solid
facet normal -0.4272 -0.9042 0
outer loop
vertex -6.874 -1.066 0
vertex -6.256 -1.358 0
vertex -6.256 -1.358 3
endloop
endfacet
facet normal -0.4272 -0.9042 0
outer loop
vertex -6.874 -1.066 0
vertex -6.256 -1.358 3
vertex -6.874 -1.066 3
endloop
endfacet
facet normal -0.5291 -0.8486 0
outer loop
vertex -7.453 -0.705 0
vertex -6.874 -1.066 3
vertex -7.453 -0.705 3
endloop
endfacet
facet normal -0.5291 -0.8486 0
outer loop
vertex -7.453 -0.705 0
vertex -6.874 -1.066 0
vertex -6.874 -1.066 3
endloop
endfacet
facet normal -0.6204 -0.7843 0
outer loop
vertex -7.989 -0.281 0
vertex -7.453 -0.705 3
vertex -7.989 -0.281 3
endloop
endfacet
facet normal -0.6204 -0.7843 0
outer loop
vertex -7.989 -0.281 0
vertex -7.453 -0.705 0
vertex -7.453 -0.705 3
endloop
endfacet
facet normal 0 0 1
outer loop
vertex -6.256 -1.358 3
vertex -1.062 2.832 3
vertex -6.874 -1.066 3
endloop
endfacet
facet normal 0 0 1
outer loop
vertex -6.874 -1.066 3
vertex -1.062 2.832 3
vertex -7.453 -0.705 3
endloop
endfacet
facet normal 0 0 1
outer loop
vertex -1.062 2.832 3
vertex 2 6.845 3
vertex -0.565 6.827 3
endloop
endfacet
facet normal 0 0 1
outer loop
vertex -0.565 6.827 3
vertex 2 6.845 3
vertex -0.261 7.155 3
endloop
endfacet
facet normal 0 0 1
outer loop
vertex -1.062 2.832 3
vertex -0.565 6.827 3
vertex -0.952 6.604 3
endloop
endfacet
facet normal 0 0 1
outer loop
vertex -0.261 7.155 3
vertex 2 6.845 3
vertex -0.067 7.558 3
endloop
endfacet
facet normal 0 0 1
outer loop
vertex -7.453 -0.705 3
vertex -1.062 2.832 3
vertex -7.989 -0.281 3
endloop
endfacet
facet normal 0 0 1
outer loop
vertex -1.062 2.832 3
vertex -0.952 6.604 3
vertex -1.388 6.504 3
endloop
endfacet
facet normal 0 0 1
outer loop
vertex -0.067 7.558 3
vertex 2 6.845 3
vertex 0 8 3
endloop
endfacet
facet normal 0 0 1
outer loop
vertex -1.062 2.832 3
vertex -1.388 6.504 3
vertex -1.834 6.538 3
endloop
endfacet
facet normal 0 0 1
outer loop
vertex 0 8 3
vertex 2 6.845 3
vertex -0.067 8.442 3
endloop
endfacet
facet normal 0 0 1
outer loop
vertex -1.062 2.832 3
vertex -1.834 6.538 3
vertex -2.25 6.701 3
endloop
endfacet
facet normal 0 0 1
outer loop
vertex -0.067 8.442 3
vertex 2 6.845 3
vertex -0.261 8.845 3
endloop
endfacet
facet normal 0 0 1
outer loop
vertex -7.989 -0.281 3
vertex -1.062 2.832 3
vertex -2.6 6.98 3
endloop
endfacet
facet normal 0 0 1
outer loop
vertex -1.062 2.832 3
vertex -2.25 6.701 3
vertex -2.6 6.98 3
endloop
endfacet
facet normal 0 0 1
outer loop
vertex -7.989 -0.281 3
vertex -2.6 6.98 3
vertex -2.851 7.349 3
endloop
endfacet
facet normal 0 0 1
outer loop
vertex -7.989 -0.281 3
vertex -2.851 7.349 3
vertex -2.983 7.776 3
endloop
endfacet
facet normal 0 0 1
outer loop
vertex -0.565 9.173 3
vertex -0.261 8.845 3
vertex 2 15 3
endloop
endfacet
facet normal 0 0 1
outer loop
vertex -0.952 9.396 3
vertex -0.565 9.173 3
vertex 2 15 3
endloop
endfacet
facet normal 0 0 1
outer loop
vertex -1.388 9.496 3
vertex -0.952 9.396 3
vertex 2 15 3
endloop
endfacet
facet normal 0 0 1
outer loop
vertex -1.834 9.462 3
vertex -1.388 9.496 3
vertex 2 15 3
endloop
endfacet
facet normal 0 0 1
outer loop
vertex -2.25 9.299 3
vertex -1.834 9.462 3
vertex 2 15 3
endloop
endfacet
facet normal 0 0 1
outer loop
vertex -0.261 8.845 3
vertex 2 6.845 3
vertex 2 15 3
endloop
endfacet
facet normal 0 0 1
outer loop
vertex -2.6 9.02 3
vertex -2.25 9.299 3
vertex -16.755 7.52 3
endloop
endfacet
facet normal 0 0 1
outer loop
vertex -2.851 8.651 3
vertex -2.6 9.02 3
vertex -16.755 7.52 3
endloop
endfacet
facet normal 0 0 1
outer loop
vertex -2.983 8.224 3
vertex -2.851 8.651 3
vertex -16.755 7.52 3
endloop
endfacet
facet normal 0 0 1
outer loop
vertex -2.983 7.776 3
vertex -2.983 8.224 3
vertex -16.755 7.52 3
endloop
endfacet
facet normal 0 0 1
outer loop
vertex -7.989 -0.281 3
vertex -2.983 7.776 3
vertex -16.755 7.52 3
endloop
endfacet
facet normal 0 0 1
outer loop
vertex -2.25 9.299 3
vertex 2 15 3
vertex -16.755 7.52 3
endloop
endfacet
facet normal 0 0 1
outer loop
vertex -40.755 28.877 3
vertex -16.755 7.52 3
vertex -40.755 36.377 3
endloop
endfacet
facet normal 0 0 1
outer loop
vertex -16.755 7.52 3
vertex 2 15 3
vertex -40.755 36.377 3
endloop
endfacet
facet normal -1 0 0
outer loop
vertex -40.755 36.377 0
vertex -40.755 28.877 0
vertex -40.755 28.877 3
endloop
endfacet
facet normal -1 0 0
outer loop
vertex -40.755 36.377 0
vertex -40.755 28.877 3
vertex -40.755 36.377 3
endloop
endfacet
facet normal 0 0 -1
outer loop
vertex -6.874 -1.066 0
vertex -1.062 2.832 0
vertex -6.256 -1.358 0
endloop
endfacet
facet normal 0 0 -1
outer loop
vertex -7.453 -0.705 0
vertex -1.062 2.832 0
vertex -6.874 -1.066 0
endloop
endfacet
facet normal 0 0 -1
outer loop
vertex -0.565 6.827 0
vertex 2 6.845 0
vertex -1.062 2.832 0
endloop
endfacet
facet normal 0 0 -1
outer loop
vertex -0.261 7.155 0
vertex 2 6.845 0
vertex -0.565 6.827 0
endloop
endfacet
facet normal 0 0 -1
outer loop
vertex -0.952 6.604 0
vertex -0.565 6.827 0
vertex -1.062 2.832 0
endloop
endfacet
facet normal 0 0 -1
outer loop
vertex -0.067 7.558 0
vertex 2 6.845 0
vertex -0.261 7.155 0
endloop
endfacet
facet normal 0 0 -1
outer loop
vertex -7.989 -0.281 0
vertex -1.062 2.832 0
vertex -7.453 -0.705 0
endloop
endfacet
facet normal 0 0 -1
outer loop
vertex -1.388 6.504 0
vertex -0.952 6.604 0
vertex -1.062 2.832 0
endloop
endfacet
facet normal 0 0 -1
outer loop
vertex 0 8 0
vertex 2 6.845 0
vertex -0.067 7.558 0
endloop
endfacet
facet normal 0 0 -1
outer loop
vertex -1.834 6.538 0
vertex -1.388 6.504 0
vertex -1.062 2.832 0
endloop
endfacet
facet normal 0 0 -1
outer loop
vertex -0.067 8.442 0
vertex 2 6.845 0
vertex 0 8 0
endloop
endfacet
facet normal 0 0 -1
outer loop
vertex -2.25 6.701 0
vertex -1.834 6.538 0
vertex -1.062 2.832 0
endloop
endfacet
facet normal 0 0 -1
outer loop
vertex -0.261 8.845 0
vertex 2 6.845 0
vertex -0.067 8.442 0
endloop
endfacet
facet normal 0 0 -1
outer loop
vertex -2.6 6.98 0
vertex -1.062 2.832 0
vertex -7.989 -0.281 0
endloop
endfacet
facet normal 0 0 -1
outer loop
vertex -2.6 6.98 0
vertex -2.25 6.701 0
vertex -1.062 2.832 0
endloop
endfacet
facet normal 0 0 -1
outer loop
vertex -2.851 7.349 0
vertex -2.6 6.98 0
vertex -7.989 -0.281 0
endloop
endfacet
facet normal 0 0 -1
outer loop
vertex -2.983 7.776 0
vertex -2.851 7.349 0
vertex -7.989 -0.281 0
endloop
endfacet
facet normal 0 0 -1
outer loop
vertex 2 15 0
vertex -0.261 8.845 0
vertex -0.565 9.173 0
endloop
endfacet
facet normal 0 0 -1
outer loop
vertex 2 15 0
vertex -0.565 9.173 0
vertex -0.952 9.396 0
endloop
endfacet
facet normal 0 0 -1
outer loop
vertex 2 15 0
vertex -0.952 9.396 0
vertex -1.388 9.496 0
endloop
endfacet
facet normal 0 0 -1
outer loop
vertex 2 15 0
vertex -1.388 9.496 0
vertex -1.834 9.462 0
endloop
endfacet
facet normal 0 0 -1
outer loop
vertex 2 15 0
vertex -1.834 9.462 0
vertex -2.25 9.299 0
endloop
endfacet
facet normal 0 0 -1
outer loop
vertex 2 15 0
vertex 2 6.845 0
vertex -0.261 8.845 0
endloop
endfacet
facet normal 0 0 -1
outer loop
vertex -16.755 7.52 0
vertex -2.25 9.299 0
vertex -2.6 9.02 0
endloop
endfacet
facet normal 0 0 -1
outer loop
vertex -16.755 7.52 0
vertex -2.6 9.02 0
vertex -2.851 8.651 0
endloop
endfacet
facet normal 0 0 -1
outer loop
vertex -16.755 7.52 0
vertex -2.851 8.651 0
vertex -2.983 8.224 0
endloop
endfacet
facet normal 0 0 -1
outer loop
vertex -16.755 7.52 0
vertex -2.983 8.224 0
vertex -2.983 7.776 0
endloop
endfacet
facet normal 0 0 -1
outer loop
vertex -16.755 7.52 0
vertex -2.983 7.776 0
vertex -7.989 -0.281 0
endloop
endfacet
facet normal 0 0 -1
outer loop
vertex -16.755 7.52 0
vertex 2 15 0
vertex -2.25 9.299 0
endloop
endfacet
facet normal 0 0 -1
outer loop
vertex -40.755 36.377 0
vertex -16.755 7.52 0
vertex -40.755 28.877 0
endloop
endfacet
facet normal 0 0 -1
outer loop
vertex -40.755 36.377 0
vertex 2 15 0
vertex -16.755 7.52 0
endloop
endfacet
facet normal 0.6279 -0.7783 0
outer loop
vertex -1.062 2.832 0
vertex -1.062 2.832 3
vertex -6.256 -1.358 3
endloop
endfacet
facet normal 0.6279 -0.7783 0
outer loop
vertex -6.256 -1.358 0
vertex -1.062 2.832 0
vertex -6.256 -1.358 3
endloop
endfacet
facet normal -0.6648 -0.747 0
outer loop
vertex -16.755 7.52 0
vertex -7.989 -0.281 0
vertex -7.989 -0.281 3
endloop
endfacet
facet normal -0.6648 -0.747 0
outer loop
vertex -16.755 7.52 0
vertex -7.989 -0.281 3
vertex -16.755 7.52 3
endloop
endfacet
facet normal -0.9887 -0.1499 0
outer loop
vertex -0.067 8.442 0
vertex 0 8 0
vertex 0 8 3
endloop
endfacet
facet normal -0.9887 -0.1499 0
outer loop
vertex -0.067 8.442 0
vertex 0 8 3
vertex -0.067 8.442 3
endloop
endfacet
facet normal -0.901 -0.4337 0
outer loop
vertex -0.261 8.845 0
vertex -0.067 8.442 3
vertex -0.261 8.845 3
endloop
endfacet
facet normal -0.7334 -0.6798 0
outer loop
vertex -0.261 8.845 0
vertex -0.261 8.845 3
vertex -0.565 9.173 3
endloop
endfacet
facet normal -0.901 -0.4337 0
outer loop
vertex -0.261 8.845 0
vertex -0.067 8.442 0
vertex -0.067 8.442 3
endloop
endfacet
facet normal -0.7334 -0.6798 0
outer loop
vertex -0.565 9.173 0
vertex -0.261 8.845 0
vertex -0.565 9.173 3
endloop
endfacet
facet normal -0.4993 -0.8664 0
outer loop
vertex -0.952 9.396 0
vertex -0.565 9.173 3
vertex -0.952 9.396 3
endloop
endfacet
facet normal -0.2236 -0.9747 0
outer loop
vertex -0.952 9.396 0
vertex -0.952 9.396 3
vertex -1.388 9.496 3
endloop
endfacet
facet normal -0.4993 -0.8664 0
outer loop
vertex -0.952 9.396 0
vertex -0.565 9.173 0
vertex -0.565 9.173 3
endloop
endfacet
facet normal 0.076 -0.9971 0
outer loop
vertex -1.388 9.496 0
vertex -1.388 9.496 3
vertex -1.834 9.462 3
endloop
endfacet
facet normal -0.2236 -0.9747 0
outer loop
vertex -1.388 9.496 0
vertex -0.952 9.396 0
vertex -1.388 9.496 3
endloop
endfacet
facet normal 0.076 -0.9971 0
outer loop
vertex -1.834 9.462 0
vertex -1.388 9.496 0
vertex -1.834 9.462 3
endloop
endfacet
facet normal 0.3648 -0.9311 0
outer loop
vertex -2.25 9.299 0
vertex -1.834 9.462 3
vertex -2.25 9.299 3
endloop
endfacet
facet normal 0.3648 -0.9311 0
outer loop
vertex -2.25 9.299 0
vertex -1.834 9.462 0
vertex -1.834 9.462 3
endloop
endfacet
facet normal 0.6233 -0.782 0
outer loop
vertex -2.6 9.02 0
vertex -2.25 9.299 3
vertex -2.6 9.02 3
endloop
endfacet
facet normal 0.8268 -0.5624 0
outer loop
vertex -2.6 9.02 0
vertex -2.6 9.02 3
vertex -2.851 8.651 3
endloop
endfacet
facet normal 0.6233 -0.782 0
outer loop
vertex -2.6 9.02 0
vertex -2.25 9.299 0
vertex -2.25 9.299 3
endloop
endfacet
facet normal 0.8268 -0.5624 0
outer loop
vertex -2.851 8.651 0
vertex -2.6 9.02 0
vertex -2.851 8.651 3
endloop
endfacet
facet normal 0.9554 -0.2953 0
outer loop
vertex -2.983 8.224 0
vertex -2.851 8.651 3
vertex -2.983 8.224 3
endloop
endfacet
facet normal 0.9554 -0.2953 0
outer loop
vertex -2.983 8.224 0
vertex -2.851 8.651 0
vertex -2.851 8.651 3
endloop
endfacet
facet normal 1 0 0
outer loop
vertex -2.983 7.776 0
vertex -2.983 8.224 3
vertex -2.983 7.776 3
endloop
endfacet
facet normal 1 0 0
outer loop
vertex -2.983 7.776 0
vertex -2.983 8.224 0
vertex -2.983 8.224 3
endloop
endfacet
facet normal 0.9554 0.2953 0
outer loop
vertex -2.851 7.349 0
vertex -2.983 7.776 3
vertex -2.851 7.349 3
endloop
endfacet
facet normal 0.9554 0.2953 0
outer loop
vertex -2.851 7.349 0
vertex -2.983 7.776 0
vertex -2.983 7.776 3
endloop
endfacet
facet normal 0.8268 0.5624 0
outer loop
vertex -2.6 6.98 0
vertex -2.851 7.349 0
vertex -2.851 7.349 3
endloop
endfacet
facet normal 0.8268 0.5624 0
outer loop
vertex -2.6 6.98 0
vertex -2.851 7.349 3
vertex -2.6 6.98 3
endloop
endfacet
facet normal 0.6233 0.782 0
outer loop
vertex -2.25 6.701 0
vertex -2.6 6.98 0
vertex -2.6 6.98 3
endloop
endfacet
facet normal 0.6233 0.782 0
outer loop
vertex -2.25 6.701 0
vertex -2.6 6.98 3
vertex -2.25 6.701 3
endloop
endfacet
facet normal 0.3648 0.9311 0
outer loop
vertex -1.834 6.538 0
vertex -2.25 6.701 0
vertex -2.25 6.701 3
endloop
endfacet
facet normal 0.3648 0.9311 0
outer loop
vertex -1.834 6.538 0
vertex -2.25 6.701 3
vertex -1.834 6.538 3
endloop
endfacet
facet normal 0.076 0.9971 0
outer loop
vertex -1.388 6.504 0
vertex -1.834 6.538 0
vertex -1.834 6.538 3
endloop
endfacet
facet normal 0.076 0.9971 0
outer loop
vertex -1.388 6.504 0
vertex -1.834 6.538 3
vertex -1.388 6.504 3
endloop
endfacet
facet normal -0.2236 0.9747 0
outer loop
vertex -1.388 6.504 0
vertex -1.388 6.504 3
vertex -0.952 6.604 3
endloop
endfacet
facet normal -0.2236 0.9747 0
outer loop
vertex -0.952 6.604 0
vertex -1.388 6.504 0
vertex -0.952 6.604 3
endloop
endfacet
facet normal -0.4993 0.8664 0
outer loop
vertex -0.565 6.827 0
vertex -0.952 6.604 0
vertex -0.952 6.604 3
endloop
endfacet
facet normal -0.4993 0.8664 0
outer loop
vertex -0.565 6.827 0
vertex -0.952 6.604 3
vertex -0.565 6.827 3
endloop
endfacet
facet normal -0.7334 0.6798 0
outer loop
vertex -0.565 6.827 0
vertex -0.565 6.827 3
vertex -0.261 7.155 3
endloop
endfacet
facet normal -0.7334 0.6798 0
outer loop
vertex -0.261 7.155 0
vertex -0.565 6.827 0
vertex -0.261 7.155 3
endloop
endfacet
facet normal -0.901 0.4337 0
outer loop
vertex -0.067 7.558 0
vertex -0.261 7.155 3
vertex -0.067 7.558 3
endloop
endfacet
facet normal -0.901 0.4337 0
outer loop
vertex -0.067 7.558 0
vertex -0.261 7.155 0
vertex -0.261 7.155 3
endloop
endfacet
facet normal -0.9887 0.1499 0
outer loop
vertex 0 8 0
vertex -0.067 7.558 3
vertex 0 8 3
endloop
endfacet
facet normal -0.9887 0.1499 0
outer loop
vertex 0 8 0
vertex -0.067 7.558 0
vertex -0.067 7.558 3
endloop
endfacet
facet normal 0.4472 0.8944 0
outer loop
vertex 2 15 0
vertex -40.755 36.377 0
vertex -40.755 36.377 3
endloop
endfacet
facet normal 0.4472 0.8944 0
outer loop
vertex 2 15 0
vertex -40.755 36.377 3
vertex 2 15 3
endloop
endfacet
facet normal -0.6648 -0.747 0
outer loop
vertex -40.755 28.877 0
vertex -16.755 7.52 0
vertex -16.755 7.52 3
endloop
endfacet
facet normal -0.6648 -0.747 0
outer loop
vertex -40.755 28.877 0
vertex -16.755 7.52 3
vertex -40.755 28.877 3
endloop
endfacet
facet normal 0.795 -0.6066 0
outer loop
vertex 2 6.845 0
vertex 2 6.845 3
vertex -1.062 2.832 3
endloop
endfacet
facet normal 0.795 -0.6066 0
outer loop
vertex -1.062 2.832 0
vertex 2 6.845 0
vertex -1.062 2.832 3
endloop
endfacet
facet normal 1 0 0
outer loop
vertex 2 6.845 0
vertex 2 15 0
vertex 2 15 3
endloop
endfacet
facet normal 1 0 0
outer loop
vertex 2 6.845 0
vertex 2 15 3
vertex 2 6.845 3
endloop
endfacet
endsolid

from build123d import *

# Parameters (mm, degrees)
SKETCH1_R           = 1.5
BOSS_EXTRUDE1_DEPTH = 3
CUT_EXTRUDE1_DEPTH  = 3


with BuildPart() as part:
    # Sketch1 → Boss-Extrude1 (new body)
    with BuildSketch(Plane.XY):
        with BuildLine():
            Line((2, 15), (2, 4.201633911))
            ThreePointArc((2, 4.201633911), (-1.543579693, -1.272486957), (-7.988666425, -0.280613309))
            Line((-7.988666425, -0.280613309), (-16.754941475, 7.52032788))
            Line((-16.754941475, 7.52032788), (-40.754941475, 28.877470737))
            Line((-40.754941475, 28.877470737), (-40.754941475, 36.377470737))
            Line((-40.754941475, 36.377470737), (2, 15))
        make_face()
        with Locations((-1.5, 8)):
            Circle(SKETCH1_R, mode=Mode.SUBTRACT)
    extrude(amount=BOSS_EXTRUDE1_DEPTH)

    # Sketch2 → Cut-Extrude1 (cut)
    with BuildSketch(Plane.XY.offset(3)):
        Polygon((-1.061667456, 2.832415464), (-6.529971665, -1.578677992), (-7.079129118, -3.627506614), (6.602158547, -3.973243126), (4.478348548, 4.339015555), (2, 6.845428543), align=None)
    extrude(amount=-CUT_EXTRUDE1_DEPTH, mode=Mode.SUBTRACT)


solid = part.part
